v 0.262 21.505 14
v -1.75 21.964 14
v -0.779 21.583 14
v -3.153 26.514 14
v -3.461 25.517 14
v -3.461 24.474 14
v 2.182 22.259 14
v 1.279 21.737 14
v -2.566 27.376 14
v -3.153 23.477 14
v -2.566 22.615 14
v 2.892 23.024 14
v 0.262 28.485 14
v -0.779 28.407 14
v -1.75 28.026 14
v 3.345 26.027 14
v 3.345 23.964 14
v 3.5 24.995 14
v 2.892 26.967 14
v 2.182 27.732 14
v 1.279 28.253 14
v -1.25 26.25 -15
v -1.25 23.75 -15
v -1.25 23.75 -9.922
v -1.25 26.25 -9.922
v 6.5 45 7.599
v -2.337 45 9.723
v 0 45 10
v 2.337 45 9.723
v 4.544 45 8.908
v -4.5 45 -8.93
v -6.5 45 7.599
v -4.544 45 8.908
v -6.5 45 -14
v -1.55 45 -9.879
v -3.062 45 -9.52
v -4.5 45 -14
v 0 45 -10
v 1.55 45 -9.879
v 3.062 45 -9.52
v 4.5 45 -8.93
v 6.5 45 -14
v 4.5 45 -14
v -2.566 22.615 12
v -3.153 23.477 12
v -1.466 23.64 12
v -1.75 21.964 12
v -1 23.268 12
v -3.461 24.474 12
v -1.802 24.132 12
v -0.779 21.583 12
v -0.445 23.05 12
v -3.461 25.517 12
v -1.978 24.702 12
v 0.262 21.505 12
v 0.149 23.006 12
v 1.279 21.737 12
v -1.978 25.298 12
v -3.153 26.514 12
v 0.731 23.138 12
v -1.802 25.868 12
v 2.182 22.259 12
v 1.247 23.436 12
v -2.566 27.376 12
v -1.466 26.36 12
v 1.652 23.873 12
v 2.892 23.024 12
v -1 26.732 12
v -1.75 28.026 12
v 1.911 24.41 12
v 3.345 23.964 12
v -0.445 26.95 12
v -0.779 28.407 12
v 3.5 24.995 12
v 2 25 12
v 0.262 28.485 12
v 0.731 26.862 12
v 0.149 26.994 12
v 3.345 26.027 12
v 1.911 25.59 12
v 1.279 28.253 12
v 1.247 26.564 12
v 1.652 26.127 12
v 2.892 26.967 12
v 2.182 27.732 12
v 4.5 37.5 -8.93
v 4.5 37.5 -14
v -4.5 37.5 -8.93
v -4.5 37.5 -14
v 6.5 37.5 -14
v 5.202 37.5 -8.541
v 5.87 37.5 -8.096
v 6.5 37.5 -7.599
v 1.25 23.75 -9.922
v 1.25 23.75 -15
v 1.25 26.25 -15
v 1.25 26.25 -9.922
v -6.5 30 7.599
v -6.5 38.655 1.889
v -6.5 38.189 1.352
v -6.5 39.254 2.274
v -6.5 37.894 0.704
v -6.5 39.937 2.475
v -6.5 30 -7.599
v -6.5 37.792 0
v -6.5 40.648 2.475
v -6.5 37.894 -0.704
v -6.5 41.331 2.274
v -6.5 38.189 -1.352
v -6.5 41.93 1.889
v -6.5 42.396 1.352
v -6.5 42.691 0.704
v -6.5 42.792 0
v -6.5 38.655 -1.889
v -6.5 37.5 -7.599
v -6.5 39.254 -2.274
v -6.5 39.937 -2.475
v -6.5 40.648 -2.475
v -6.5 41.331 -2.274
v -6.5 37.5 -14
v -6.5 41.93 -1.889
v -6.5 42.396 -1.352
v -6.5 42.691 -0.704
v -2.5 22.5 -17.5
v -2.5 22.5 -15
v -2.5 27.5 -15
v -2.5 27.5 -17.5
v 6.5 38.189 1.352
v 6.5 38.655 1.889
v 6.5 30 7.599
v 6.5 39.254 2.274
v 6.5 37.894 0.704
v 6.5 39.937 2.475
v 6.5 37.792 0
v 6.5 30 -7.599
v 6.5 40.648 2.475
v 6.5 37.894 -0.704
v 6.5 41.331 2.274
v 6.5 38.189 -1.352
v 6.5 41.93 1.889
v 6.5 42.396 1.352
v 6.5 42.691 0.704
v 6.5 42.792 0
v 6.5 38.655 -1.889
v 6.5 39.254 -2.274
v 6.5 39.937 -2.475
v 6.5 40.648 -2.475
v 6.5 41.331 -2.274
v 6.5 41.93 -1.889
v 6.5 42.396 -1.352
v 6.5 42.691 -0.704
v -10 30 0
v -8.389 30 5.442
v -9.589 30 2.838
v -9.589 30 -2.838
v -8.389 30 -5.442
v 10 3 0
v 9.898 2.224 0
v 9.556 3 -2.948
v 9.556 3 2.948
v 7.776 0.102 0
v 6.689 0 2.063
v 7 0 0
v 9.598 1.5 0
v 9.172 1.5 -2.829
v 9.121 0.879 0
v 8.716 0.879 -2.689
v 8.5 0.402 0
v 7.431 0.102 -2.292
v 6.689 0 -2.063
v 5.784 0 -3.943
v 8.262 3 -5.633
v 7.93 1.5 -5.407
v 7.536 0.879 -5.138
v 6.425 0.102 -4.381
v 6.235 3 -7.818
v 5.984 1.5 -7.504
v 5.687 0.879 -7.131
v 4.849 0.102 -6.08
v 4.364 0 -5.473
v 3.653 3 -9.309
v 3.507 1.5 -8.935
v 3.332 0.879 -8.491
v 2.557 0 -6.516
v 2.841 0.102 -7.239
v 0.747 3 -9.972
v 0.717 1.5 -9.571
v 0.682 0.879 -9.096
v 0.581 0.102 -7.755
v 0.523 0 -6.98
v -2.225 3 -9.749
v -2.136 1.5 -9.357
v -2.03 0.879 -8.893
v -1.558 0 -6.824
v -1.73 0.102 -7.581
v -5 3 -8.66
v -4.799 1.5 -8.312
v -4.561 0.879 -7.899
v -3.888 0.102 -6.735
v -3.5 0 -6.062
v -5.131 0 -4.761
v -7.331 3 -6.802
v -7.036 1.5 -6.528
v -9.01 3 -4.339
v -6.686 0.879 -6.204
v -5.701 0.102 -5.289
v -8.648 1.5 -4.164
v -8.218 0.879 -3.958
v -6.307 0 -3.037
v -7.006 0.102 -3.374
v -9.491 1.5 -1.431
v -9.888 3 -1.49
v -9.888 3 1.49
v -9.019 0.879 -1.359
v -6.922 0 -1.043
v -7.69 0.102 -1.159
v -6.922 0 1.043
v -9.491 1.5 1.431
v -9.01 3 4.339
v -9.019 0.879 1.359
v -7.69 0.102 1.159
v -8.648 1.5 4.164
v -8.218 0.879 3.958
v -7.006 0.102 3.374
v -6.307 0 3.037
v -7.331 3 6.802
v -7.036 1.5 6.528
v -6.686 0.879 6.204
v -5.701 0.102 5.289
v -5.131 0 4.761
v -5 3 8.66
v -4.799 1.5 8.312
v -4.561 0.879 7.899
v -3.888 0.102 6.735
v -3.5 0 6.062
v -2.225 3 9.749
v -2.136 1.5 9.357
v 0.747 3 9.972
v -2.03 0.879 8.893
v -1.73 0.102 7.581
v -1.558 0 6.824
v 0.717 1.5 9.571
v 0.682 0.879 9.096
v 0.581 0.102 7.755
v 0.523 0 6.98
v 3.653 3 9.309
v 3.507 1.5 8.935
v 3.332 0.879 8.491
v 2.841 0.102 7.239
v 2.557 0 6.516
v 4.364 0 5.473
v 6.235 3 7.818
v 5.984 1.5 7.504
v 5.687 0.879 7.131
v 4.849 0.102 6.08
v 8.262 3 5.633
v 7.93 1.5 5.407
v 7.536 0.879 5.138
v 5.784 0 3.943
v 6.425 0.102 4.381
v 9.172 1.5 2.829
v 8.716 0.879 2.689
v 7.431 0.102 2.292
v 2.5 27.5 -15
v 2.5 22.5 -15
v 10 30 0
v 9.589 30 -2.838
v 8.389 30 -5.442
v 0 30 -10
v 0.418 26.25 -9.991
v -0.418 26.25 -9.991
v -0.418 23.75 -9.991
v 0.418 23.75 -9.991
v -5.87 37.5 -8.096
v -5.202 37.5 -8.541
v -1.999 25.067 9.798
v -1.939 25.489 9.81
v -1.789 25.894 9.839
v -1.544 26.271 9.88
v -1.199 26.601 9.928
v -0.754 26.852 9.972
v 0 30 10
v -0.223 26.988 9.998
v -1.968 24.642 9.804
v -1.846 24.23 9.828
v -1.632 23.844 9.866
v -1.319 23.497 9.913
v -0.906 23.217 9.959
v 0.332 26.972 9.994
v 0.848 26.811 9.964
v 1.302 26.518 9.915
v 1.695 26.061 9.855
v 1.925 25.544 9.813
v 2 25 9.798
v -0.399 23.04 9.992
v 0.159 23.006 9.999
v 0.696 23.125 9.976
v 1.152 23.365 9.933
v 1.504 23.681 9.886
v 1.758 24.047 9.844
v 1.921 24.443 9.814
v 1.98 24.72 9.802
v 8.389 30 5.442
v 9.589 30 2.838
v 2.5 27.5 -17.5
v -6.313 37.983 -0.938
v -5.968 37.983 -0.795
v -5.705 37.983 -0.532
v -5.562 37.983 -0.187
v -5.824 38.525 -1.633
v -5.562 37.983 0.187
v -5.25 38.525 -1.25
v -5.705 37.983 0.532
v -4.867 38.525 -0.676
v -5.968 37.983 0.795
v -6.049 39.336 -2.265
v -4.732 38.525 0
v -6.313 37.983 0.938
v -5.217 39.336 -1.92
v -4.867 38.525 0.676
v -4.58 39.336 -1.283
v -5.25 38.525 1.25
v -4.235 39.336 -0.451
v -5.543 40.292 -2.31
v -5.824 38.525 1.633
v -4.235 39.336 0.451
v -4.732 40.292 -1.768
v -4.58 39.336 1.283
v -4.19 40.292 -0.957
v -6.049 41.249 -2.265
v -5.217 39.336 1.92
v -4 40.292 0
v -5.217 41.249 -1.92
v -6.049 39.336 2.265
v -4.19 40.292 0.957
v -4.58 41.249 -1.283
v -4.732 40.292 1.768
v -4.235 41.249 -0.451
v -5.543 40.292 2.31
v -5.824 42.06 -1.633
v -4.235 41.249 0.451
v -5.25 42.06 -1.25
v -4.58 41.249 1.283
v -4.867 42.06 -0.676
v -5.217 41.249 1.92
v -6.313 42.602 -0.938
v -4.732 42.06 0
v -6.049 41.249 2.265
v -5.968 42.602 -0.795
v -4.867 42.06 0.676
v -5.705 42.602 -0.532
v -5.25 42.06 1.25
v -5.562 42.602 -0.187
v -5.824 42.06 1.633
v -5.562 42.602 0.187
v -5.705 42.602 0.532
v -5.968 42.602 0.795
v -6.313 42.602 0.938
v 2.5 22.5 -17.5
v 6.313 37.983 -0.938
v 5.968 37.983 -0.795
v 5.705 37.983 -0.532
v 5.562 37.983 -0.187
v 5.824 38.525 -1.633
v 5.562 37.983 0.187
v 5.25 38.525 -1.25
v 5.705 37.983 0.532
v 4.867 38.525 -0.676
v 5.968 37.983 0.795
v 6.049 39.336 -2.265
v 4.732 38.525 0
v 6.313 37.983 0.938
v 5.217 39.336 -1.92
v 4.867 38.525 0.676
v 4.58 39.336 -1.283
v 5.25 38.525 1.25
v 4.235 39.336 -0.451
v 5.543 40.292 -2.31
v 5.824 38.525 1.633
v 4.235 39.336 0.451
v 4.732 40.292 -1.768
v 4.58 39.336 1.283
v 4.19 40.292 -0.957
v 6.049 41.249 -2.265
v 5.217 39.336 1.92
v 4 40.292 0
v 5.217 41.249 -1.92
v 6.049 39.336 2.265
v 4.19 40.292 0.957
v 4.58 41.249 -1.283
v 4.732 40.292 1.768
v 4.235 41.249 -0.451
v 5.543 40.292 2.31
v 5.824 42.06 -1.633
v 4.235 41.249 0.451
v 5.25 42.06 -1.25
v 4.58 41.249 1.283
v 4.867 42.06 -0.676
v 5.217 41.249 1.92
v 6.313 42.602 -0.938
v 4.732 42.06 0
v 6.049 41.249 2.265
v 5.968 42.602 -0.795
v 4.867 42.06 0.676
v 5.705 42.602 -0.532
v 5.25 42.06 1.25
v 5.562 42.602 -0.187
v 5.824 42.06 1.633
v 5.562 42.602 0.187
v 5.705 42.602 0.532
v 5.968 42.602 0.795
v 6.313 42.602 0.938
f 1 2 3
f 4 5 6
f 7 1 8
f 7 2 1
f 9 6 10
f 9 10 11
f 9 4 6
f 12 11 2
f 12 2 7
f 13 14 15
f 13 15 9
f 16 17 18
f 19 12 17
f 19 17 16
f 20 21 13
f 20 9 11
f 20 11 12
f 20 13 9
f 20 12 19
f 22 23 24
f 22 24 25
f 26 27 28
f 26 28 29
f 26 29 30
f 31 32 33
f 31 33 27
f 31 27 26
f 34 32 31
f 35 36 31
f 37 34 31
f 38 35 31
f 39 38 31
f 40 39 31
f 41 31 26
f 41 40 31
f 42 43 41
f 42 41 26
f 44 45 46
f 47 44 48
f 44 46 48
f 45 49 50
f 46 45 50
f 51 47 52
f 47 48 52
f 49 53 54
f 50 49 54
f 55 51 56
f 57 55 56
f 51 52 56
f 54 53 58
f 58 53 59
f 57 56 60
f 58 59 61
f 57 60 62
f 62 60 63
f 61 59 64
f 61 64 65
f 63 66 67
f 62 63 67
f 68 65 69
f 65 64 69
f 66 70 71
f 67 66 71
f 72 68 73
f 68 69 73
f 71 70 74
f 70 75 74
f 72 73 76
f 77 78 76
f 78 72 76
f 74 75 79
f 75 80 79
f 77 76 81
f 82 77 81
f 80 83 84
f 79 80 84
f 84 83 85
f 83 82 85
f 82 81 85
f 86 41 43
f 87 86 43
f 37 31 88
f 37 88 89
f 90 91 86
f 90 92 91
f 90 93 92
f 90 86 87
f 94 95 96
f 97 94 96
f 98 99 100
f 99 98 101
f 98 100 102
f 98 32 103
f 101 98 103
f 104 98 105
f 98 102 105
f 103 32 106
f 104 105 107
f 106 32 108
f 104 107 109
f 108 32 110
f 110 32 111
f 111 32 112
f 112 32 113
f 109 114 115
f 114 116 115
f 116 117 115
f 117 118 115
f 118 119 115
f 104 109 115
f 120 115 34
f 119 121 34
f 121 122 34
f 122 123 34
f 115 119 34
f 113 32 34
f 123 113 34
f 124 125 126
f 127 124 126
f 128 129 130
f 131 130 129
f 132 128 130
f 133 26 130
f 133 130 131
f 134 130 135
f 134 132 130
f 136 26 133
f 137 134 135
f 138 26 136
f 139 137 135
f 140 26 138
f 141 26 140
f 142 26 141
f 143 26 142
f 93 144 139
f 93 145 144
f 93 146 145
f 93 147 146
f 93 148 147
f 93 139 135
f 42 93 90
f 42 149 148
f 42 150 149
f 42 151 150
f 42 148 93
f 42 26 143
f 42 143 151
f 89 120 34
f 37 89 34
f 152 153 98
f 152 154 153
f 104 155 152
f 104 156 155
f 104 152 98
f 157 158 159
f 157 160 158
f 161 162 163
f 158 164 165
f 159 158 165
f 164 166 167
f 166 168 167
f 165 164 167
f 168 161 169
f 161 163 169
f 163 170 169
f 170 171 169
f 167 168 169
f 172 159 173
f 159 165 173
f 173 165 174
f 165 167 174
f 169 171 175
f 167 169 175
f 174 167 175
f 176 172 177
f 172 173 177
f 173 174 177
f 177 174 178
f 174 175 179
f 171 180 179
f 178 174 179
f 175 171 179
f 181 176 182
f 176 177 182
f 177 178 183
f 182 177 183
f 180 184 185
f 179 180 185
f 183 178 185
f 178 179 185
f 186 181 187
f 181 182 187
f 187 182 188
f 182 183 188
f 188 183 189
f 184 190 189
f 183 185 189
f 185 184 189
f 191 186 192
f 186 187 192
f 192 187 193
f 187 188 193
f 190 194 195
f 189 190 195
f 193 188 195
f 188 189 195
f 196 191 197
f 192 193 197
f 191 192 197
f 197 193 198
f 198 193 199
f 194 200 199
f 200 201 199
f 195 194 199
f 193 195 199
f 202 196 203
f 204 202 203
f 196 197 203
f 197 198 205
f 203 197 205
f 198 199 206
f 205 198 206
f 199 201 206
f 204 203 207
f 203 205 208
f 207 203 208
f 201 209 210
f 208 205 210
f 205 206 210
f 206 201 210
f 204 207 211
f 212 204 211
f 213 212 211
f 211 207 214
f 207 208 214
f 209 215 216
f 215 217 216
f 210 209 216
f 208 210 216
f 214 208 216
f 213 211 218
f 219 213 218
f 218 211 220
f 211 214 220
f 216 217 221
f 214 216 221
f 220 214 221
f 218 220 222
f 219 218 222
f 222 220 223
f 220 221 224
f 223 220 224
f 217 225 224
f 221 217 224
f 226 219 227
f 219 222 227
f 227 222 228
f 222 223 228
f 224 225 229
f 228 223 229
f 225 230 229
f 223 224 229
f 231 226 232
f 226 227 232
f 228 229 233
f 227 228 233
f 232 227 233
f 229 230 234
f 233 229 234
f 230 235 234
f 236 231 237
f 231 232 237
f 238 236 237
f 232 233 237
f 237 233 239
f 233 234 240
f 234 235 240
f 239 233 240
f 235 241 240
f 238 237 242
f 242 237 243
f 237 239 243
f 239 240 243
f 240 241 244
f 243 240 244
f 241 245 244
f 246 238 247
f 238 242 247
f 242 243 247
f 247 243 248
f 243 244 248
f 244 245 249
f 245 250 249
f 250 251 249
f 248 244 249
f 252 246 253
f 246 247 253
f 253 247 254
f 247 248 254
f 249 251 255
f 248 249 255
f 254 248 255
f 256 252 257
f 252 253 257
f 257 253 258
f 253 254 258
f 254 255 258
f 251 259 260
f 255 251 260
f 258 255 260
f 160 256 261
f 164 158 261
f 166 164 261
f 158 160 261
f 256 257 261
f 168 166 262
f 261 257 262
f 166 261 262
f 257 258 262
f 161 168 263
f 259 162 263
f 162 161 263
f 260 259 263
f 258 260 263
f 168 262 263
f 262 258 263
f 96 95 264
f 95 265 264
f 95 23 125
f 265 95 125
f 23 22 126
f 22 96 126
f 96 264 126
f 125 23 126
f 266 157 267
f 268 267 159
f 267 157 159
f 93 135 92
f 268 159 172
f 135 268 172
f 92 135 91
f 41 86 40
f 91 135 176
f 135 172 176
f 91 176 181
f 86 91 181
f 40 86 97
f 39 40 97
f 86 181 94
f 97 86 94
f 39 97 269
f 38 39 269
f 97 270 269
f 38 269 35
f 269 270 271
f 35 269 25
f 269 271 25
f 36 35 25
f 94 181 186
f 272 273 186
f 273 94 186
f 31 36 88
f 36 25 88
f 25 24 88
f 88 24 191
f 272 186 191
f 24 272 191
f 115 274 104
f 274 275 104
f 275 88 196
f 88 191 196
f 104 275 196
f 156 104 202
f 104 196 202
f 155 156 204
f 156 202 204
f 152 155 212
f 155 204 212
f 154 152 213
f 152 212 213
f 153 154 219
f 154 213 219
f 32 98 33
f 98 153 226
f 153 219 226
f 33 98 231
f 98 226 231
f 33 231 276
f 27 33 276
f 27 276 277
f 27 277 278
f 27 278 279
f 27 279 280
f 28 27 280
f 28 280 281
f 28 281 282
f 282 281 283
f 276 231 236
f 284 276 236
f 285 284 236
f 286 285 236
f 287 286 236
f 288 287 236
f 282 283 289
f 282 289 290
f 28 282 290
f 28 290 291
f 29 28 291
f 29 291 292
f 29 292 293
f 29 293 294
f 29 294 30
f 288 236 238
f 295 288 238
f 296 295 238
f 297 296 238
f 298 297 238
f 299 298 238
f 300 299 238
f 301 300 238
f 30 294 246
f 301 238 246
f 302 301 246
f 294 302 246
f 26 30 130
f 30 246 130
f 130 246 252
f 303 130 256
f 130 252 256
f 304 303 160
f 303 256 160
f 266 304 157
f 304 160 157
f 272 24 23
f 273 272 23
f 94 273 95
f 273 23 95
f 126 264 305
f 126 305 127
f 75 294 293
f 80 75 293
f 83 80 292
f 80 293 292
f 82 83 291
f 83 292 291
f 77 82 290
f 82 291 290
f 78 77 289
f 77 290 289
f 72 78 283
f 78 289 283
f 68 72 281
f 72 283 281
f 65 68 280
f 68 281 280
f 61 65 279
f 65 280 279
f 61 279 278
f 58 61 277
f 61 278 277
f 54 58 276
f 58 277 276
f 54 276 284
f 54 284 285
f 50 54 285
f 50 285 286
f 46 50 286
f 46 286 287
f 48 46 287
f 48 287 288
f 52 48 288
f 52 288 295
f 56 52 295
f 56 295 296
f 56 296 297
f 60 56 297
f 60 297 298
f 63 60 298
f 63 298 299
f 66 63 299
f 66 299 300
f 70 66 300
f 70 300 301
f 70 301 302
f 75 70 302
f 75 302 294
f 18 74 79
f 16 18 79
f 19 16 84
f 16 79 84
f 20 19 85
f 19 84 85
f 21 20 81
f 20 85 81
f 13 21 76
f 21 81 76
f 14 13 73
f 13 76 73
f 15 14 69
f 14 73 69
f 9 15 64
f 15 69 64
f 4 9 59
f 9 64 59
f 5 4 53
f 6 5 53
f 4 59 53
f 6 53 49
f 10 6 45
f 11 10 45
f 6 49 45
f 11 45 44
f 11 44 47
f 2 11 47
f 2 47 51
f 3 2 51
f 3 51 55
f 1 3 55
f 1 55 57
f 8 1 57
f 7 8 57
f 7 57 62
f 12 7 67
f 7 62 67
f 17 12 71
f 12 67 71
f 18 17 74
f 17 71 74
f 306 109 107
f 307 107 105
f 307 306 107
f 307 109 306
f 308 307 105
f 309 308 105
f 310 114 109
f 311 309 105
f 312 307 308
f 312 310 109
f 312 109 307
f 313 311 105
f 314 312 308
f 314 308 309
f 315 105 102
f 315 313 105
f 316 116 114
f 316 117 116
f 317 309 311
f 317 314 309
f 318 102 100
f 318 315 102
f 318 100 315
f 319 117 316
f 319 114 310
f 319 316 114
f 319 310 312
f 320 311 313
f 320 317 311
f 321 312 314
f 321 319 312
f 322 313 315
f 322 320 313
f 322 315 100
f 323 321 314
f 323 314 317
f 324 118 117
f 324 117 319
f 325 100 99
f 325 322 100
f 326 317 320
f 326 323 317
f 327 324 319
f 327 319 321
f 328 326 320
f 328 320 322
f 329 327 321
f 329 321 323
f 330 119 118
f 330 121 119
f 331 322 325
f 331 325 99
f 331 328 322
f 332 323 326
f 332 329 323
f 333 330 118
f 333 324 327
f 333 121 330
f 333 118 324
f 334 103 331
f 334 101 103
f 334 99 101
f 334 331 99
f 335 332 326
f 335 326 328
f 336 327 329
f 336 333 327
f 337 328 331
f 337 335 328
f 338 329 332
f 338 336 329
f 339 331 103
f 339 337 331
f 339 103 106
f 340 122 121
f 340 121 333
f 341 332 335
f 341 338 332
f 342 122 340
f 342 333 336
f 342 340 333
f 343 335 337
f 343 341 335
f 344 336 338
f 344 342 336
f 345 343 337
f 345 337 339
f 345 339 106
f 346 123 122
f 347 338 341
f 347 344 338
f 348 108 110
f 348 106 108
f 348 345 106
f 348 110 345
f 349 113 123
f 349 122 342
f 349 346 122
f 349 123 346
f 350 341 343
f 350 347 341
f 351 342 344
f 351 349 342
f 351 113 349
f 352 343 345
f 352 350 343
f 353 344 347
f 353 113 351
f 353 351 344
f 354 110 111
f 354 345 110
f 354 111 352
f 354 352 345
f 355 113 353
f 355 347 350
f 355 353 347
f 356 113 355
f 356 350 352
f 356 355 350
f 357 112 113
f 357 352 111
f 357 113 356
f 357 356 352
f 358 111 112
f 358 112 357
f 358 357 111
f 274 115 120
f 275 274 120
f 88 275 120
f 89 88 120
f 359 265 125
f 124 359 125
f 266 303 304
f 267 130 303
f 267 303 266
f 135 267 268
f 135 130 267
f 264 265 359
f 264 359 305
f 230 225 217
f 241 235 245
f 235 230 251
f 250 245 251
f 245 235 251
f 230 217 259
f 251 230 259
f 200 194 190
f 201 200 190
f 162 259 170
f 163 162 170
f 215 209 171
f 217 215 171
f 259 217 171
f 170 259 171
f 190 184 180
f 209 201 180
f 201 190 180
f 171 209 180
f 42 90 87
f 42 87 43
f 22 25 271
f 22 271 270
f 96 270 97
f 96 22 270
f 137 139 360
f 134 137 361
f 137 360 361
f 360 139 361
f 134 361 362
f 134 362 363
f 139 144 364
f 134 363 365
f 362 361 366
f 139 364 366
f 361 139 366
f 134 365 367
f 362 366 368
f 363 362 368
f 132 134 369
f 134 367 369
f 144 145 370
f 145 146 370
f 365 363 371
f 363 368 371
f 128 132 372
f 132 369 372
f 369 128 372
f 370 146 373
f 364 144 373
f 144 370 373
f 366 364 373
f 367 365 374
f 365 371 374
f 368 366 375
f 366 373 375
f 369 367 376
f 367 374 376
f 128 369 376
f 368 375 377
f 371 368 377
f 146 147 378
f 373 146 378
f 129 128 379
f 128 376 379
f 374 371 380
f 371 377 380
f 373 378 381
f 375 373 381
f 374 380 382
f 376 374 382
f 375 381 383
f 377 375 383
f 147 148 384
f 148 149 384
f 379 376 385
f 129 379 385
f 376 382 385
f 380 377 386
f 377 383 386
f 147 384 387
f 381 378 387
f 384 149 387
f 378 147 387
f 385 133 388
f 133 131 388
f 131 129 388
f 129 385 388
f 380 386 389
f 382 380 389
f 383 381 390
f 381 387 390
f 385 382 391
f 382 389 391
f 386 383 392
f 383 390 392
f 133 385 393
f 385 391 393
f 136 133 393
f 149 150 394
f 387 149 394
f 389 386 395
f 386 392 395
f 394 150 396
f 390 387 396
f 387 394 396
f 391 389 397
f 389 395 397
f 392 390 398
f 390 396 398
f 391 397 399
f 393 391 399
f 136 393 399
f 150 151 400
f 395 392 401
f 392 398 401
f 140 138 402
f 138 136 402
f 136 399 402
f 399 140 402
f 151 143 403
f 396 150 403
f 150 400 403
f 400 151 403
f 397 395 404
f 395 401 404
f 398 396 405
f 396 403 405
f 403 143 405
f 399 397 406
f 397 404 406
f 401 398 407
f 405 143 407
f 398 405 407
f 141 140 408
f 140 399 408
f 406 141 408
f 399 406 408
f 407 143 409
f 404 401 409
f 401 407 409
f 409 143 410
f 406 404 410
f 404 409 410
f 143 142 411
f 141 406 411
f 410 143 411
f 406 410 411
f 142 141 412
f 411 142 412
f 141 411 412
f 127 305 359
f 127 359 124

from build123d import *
from build123d.topology import SkipClean

# Parameters (mm, degrees)
SKETCH1_R                            = 10
BOSS_EXTRUDE2_DEPTH                  = 45
SKETCH4_OUTSIDE_W                    = 32.63
SKETCH4_OUTSIDE_H                    = 32.63
SKETCH4_OUTSIDE_W_2                  = 13
SKETCH4_OUTSIDE_H_2                  = 20
CUT_EXTRUDE2_DEPTH                   = 15
FILLET2_R                            = 3
BOSS_EXTRUDE3_REACH                  = 52.249
BOSS_EXTRUDE3_END_RADIUS             = 10
SKETCH7_W                            = 2.5
SKETCH7_H                            = 2.5
BOSS_EXTRUDE3_DIRECTION_2_DEPTH      = 5
SKETCH8_W                            = 5
SKETCH8_H                            = 5
BOSS_EXTRUDE4_DEPTH                  = 2.5
SKETCH9_R                            = 2
BOSS_EXTRUDE6_DEPTH                  = 2
BOSS_EXTRUDE6_DIRECTION_2_REACH      = 55.677
BOSS_EXTRUDE6_DIRECTION_2_END_RADIUS = 10
SKETCH10_R                           = 3.5
BOSS_EXTRUDE7_DEPTH                  = 2
SKETCH11_W                           = 6.400657923
SKETCH11_H                           = 7.5
BOSS_EXTRUDE8_DEPTH                  = 2


with BuildPart() as part:
    # Sketch1 → Boss-Extrude2 (new body)
    with BuildSketch(Plane(origin=(0, 0, 0), x_dir=(1, 0, 0), z_dir=(0, 1, 0))):
        Circle(SKETCH1_R)
    extrude(amount=BOSS_EXTRUDE2_DEPTH)

    # Sketch4 outside → Cut-Extrude2 (cut)
    with BuildSketch(Plane(origin=(0, 45, 0), x_dir=(1, 0, 0), z_dir=(0, 1, 0))):
        Rectangle(SKETCH4_OUTSIDE_W, SKETCH4_OUTSIDE_H)
        Rectangle(SKETCH4_OUTSIDE_W_2, SKETCH4_OUTSIDE_H_2, mode=Mode.SUBTRACT)
    extrude(amount=-CUT_EXTRUDE2_DEPTH, mode=Mode.SUBTRACT)

    # Sketch5 → Cut-Revolve1 (revolve, cut)
    with BuildSketch(Plane.ZY.offset(6.5)):
        with BuildLine():
            Line((0, 42.792409201), (0, 37.792409201))
            ThreePointArc((0, 37.792409201), (-2.5, 40.292409201), (0, 42.792409201))
        make_face()
    cut_revolve1 = revolve(axis=Axis((-6.5, 42.792409201, 0), (0, -1, 0)), mode=Mode.SUBTRACT)

    # Mirror2: Cut-Revolve1 across plane
    add(cut_revolve1.mirror(Plane(origin=(0, 0, 0), x_dir=(0, 0, 1), z_dir=(1, 0, 0))), mode=Mode.SUBTRACT)

    # Fillet2
    fillet2_edges = [part.edges().sort_by_distance(p)[0] for p in [
        (-10, 0, 0),
    ]]
    fillet(fillet2_edges, radius=FILLET2_R)

    # Boss-Extrude3: up to this cylinder (the profile starts outside it)
    boss_extrude3_end = Plane(origin=(0, 25, 0), z_dir=(0, -1, 0)) * Cylinder(BOSS_EXTRUDE3_END_RADIUS, 125.498, mode=Mode.PRIVATE)
    # Sketch7 → Boss-Extrude3 (add, up to the surface)
    with BuildSketch(Plane.XY.offset(-10), mode=Mode.PRIVATE) as boss_extrude3_sk1:
        with Locations((0, 25)):
            Rectangle(SKETCH7_W, SKETCH7_H)
    boss_extrude3_tool1 = extrude(boss_extrude3_sk1.sketch, amount=BOSS_EXTRUDE3_REACH, mode=Mode.PRIVATE) - boss_extrude3_end
    add(boss_extrude3_tool1.solids().sort_by_distance((0, 25, -10))[0])
    add(boss_extrude3_tool1.solids().sort_by_distance((0, 25, -10))[1])

    # Sketch7 → Boss-Extrude3 direction 2 (add)
    with BuildSketch(Plane.XY.offset(-10)):
        with Locations((0, 25)):
            Rectangle(SKETCH7_W, SKETCH7_H)
    extrude(amount=-BOSS_EXTRUDE3_DIRECTION_2_DEPTH)

    # Sketch8 → Boss-Extrude4 (add)
    with BuildSketch(Plane(origin=(0, 0, -15), x_dir=(-1, 0, 0), z_dir=(0, 0, -1))):
        with Locations((0, 25)):
            Rectangle(SKETCH8_W, SKETCH8_H)
    extrude(amount=BOSS_EXTRUDE4_DEPTH)

    # Sketch9 → Boss-Extrude6 (add)
    with BuildSketch(Plane.XY.offset(10)):
        with Locations((0, 25)):
            Circle(SKETCH9_R)
    extrude(amount=BOSS_EXTRUDE6_DEPTH)

    # Boss-Extrude6 direction 2: up to this cylinder (the profile starts outside it)
    with SkipClean():  # the faces are left unmerged after this step: merging them gives an invalid solid
        boss_extrude6_direction_2_end = Plane(origin=(0, 25, 0), z_dir=(0, -1, 0)) * Cylinder(BOSS_EXTRUDE6_DIRECTION_2_END_RADIUS, 132.354, mode=Mode.PRIVATE)
        # Sketch9 → Boss-Extrude6 direction 2 (add, up to the surface)
        with BuildSketch(Plane.XY.offset(10), mode=Mode.PRIVATE) as boss_extrude6_direction_2_sk1:
            with Locations((0, 25)):
                Circle(SKETCH9_R)
        boss_extrude6_direction_2_tool1 = extrude(boss_extrude6_direction_2_sk1.sketch, amount=-BOSS_EXTRUDE6_DIRECTION_2_REACH, mode=Mode.PRIVATE) - boss_extrude6_direction_2_end
        add(boss_extrude6_direction_2_tool1.solids().sort_by_distance((0, 25, 10))[0])
        add(boss_extrude6_direction_2_tool1.solids().sort_by_distance((0, 25, 10))[1])

    # Sketch10 → Boss-Extrude7 (add)
    with SkipClean():  # the faces are left unmerged after this step: merging them gives an invalid solid
        with BuildSketch(Plane.XY.offset(12)):
            with Locations((0, 24.995165492)):
                Circle(SKETCH10_R)
        extrude(amount=BOSS_EXTRUDE7_DEPTH)

    # Sketch11 → Boss-Extrude8 (add)
    with SkipClean():  # the faces are left unmerged after this step: merging them gives an invalid solid
        with BuildSketch(Plane(origin=(6.5, 0, 0), x_dir=(0, 0, -1), z_dir=(1, 0, 0))):
            with Locations((10.799671038, 41.25)):
                Rectangle(SKETCH11_W, SKETCH11_H)
        boss_extrude8 = extrude(amount=-BOSS_EXTRUDE8_DEPTH)

    # Mirror3: Boss-Extrude8 across plane
    with SkipClean():  # the faces are left unmerged after this step: merging them gives an invalid solid
        add(boss_extrude8.mirror(Plane(origin=(0, 0, 0), x_dir=(0, 0, 1), z_dir=(1, 0, 0))))


solid = part.part
